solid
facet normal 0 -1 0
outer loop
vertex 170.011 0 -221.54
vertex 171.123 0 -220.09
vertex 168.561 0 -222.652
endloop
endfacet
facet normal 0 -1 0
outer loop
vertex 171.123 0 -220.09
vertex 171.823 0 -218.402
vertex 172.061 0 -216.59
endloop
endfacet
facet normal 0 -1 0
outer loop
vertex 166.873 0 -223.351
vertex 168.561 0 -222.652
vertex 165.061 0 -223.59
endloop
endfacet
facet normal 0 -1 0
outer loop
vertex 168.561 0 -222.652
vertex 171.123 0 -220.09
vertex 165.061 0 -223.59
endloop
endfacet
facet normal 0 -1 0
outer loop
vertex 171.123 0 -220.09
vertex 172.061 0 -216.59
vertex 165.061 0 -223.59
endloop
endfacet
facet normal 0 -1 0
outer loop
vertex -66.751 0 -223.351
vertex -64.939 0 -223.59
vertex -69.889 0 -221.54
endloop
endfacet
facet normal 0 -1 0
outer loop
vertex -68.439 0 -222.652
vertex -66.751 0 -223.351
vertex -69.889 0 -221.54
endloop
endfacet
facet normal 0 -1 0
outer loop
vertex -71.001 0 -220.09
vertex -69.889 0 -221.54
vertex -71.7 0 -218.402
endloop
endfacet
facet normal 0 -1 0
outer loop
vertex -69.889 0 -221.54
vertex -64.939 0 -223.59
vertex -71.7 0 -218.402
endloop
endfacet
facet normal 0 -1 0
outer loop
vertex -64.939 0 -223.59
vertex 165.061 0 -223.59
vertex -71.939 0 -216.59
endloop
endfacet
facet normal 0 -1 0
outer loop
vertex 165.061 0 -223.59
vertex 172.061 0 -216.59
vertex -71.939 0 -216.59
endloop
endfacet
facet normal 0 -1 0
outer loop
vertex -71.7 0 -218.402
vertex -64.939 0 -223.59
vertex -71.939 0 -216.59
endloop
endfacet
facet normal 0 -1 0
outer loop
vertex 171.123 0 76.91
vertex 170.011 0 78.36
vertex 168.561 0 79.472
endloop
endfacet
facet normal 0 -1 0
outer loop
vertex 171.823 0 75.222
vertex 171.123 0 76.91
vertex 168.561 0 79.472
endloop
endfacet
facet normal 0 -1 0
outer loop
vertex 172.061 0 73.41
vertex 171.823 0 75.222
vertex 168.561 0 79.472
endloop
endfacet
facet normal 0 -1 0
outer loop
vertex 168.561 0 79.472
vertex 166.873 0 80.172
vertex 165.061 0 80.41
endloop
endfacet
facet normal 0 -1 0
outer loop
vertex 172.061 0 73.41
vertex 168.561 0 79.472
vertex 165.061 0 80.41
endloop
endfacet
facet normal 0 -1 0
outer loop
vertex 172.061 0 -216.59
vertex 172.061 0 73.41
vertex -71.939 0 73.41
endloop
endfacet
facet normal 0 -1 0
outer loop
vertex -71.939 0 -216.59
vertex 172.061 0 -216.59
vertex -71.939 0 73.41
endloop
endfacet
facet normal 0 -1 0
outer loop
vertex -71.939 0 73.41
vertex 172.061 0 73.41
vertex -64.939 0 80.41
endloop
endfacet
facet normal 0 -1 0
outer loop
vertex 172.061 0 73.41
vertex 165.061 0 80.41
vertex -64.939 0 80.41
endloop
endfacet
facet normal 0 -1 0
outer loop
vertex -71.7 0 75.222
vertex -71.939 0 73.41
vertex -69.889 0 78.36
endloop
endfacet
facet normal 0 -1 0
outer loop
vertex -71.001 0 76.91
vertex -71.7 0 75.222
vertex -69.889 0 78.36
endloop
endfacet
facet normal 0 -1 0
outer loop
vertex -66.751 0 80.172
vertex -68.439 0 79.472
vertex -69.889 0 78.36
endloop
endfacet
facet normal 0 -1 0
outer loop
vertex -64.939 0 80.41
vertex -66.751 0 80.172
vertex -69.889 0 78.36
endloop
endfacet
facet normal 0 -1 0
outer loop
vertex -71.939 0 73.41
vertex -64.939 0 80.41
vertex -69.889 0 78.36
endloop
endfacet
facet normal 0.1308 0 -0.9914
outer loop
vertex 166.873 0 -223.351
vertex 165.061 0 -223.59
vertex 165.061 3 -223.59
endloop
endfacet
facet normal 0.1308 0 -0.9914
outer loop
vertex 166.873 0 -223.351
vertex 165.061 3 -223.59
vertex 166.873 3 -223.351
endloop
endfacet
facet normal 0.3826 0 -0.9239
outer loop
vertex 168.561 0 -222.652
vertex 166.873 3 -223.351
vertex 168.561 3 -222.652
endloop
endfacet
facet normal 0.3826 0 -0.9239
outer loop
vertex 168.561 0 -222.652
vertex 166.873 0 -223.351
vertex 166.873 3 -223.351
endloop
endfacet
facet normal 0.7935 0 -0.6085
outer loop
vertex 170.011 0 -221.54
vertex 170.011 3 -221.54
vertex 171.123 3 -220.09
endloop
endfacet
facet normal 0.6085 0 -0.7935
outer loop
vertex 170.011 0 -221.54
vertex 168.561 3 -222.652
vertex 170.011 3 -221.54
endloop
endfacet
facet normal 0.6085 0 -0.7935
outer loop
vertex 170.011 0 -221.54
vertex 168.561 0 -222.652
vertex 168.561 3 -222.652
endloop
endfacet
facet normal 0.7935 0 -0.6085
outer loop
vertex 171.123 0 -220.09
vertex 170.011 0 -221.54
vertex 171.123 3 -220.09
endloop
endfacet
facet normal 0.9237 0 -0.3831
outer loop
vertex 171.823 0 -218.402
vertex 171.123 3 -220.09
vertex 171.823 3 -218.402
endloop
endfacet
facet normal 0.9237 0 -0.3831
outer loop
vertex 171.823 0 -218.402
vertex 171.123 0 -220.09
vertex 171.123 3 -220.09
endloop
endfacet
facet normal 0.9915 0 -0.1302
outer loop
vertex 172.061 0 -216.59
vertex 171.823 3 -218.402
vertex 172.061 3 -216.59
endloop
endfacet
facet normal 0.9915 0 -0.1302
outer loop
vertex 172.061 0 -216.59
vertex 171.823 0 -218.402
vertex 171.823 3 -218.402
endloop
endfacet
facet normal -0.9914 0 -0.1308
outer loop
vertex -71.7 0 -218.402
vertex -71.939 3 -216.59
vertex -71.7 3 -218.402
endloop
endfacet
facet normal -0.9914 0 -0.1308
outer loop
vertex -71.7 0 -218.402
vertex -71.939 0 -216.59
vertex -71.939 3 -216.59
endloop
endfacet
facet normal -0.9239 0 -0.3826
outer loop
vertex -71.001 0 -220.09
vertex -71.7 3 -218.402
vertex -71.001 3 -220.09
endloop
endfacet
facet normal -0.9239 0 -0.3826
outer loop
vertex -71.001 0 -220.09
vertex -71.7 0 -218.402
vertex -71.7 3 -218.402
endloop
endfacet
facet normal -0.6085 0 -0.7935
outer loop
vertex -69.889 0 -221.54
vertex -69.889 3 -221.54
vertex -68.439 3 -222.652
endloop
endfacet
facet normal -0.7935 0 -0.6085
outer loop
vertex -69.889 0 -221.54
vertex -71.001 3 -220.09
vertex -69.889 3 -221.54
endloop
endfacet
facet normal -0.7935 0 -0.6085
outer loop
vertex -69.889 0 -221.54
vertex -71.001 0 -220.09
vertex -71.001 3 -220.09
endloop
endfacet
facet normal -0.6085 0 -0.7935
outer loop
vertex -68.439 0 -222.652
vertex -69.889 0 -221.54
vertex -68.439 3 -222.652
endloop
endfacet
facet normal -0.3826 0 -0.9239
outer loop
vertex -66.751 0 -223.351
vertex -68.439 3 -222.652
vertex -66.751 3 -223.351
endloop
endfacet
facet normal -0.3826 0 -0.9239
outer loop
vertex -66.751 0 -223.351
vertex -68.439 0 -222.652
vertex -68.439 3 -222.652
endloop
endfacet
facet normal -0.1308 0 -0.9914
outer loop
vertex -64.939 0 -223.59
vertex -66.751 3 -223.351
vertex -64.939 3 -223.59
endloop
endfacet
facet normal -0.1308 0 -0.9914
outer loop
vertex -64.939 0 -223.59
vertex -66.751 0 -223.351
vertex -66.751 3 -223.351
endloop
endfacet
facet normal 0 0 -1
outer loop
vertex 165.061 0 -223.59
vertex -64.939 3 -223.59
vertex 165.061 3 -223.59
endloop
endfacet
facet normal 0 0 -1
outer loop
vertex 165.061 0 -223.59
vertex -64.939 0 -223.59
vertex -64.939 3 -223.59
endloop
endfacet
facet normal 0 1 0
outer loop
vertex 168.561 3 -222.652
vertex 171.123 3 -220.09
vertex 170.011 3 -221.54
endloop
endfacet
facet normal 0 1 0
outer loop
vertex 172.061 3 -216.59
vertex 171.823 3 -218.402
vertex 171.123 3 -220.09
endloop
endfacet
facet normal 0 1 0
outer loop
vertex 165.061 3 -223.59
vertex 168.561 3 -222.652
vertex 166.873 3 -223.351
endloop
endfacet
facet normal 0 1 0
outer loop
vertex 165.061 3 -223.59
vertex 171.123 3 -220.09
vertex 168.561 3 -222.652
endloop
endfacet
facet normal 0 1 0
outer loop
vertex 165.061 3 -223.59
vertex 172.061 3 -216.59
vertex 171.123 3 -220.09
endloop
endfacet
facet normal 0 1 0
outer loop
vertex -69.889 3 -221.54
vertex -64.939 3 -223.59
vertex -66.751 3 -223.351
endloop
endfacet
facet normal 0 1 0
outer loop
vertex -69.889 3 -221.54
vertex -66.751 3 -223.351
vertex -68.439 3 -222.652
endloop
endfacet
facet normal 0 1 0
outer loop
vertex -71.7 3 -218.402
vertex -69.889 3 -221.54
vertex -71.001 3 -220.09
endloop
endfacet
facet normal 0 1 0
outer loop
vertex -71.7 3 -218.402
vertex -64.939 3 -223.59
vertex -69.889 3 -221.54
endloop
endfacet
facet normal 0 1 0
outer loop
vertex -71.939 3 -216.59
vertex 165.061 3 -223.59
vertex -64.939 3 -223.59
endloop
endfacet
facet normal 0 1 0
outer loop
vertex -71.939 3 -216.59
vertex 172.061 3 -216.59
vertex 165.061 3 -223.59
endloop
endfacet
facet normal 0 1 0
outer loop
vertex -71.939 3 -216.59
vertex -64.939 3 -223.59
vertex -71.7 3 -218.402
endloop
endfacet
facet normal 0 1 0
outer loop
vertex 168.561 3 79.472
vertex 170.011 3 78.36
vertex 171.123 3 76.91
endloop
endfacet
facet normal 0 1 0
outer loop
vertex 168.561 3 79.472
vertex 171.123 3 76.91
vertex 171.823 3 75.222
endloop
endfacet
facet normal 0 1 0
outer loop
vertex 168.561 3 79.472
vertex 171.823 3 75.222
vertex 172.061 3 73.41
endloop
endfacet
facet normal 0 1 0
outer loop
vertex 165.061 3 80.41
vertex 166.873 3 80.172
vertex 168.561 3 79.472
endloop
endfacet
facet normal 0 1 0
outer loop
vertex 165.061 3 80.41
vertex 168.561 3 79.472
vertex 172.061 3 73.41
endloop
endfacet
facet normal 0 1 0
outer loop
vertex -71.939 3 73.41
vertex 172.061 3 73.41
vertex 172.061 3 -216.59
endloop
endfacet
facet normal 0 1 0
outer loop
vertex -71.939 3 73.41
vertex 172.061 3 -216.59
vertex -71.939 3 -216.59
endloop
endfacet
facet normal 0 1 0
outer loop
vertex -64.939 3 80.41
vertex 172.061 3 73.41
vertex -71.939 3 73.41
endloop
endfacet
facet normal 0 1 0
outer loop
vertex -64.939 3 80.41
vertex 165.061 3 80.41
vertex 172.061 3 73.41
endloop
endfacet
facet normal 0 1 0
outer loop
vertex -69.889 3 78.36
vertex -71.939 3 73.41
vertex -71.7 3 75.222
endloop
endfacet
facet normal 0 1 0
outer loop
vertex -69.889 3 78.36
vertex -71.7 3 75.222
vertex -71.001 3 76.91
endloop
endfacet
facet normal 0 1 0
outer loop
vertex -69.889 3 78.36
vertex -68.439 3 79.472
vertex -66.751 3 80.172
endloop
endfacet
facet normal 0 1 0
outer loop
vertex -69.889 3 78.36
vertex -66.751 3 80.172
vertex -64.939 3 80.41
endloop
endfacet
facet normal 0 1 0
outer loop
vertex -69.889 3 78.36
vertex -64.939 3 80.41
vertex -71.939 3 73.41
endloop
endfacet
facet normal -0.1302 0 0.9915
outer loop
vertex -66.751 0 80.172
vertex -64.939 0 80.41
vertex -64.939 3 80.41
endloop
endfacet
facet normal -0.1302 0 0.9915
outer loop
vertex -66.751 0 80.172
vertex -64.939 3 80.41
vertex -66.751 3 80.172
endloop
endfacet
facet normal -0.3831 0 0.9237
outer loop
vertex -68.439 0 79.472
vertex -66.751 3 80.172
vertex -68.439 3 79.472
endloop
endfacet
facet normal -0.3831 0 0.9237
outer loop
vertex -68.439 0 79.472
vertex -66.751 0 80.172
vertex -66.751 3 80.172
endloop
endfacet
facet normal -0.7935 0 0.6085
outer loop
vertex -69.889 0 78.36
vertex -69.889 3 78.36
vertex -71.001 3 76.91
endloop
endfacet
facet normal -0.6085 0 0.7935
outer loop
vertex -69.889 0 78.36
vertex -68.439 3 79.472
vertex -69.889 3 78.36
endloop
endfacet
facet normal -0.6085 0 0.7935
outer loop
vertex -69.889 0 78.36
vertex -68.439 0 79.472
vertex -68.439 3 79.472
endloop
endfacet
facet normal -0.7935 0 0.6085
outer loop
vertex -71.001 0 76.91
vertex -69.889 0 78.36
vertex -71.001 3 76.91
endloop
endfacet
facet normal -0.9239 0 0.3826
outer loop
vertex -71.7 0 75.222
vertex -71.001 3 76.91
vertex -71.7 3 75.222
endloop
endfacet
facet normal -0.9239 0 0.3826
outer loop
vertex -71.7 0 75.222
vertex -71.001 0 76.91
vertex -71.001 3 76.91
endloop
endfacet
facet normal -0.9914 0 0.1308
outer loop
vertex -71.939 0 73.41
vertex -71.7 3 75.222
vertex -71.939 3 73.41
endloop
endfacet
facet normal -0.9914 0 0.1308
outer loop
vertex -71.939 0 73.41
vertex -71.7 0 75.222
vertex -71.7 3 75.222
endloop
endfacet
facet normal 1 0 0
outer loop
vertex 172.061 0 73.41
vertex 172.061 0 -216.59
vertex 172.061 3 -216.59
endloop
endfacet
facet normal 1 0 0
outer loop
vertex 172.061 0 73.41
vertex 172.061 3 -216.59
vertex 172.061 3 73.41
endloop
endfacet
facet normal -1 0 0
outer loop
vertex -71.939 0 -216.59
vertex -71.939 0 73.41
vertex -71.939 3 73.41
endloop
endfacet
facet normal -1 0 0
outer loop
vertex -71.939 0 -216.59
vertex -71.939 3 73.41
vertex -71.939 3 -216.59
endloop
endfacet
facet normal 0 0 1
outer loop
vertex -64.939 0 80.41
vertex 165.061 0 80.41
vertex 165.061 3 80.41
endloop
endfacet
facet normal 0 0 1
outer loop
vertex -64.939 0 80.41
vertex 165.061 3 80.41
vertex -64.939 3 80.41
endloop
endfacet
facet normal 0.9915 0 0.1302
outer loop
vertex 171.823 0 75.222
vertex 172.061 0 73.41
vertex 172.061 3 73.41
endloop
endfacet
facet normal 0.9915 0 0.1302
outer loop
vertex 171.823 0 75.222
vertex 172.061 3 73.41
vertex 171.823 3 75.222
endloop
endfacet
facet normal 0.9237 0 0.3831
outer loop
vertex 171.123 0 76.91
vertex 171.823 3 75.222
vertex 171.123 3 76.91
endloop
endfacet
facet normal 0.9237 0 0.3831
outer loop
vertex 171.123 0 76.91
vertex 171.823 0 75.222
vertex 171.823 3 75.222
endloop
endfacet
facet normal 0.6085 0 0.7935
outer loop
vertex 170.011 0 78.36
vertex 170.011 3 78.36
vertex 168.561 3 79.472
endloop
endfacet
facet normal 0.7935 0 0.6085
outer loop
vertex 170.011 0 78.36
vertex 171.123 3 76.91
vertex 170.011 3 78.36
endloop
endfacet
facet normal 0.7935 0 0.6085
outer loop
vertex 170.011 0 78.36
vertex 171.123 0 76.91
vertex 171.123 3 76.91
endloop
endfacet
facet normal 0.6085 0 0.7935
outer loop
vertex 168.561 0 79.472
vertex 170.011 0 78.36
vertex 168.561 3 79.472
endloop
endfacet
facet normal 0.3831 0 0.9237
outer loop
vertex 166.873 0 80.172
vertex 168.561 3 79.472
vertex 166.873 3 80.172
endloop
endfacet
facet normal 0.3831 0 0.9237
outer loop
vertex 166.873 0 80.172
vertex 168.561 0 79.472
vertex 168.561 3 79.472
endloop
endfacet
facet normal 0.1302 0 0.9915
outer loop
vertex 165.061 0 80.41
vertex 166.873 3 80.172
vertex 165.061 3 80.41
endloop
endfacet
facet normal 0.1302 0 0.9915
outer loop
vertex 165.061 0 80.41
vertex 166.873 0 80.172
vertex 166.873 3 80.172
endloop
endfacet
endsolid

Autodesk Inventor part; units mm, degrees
ref_plane "YZ Plane" through (0, 0, 0) normal (1, 0, 0) x (0, 1, 0)
ref_plane "XZ Plane" through (0, 0, 0) normal (0, 1, 0) x (-1, 0, 0)
ref_plane "XY Plane" through (0, 0, 0) normal (0, 0, 1) x (1, 0, 0)
sketch "Boceto1" plane through (0, 0, 0) normal (0, 1, 0) x (-1, 0, 0)
  line L0 (64.9389, -223.5898) -> (-165.0611, -223.5898)
  line L1 (-172.0611, -216.5898) -> (-172.0611, 73.4102)
  line L2 (-165.0611, 80.4102) -> (64.9389, 80.4102)
  line L3 (71.9389, 73.4102) -> (71.9389, -216.5898)
  arc A0 (-172.0611, -216.5898) -> (-165.0611, -223.5898) centre (-165.0611, -216.5898) ccw
  arc A1 (64.9389, -223.5898) -> (71.9389, -216.5898) centre (64.9389, -216.5898) ccw
  arc A2 (71.9389, 73.4102) -> (64.9389, 80.4102) centre (64.9389, 73.4102) ccw
  arc A3 (-165.0611, 80.4102) -> (-172.0611, 73.4102) centre (-165.0611, 73.4102) ccw
  point P0 (63.9389, -223.5898)
  point P1 (71.9389, -215.5898)
  point P2 (-172.0611, -215.5898)
  point P3 (-164.0611, -223.5898)
  point P4 (-172.0611, 72.4102)
  point P5 (-164.0611, 80.4102)
  point P6 (63.9389, 80.4102)
  point P7 (71.9389, 72.4102)
  dimension "d14" = 244
  dimension "d15" = 304
  dimension "d16" = 7
extrude "Extrusión1" add sketch "Boceto1" along normal blind 3
properties part number "Puerta Lateral Izquierda"
